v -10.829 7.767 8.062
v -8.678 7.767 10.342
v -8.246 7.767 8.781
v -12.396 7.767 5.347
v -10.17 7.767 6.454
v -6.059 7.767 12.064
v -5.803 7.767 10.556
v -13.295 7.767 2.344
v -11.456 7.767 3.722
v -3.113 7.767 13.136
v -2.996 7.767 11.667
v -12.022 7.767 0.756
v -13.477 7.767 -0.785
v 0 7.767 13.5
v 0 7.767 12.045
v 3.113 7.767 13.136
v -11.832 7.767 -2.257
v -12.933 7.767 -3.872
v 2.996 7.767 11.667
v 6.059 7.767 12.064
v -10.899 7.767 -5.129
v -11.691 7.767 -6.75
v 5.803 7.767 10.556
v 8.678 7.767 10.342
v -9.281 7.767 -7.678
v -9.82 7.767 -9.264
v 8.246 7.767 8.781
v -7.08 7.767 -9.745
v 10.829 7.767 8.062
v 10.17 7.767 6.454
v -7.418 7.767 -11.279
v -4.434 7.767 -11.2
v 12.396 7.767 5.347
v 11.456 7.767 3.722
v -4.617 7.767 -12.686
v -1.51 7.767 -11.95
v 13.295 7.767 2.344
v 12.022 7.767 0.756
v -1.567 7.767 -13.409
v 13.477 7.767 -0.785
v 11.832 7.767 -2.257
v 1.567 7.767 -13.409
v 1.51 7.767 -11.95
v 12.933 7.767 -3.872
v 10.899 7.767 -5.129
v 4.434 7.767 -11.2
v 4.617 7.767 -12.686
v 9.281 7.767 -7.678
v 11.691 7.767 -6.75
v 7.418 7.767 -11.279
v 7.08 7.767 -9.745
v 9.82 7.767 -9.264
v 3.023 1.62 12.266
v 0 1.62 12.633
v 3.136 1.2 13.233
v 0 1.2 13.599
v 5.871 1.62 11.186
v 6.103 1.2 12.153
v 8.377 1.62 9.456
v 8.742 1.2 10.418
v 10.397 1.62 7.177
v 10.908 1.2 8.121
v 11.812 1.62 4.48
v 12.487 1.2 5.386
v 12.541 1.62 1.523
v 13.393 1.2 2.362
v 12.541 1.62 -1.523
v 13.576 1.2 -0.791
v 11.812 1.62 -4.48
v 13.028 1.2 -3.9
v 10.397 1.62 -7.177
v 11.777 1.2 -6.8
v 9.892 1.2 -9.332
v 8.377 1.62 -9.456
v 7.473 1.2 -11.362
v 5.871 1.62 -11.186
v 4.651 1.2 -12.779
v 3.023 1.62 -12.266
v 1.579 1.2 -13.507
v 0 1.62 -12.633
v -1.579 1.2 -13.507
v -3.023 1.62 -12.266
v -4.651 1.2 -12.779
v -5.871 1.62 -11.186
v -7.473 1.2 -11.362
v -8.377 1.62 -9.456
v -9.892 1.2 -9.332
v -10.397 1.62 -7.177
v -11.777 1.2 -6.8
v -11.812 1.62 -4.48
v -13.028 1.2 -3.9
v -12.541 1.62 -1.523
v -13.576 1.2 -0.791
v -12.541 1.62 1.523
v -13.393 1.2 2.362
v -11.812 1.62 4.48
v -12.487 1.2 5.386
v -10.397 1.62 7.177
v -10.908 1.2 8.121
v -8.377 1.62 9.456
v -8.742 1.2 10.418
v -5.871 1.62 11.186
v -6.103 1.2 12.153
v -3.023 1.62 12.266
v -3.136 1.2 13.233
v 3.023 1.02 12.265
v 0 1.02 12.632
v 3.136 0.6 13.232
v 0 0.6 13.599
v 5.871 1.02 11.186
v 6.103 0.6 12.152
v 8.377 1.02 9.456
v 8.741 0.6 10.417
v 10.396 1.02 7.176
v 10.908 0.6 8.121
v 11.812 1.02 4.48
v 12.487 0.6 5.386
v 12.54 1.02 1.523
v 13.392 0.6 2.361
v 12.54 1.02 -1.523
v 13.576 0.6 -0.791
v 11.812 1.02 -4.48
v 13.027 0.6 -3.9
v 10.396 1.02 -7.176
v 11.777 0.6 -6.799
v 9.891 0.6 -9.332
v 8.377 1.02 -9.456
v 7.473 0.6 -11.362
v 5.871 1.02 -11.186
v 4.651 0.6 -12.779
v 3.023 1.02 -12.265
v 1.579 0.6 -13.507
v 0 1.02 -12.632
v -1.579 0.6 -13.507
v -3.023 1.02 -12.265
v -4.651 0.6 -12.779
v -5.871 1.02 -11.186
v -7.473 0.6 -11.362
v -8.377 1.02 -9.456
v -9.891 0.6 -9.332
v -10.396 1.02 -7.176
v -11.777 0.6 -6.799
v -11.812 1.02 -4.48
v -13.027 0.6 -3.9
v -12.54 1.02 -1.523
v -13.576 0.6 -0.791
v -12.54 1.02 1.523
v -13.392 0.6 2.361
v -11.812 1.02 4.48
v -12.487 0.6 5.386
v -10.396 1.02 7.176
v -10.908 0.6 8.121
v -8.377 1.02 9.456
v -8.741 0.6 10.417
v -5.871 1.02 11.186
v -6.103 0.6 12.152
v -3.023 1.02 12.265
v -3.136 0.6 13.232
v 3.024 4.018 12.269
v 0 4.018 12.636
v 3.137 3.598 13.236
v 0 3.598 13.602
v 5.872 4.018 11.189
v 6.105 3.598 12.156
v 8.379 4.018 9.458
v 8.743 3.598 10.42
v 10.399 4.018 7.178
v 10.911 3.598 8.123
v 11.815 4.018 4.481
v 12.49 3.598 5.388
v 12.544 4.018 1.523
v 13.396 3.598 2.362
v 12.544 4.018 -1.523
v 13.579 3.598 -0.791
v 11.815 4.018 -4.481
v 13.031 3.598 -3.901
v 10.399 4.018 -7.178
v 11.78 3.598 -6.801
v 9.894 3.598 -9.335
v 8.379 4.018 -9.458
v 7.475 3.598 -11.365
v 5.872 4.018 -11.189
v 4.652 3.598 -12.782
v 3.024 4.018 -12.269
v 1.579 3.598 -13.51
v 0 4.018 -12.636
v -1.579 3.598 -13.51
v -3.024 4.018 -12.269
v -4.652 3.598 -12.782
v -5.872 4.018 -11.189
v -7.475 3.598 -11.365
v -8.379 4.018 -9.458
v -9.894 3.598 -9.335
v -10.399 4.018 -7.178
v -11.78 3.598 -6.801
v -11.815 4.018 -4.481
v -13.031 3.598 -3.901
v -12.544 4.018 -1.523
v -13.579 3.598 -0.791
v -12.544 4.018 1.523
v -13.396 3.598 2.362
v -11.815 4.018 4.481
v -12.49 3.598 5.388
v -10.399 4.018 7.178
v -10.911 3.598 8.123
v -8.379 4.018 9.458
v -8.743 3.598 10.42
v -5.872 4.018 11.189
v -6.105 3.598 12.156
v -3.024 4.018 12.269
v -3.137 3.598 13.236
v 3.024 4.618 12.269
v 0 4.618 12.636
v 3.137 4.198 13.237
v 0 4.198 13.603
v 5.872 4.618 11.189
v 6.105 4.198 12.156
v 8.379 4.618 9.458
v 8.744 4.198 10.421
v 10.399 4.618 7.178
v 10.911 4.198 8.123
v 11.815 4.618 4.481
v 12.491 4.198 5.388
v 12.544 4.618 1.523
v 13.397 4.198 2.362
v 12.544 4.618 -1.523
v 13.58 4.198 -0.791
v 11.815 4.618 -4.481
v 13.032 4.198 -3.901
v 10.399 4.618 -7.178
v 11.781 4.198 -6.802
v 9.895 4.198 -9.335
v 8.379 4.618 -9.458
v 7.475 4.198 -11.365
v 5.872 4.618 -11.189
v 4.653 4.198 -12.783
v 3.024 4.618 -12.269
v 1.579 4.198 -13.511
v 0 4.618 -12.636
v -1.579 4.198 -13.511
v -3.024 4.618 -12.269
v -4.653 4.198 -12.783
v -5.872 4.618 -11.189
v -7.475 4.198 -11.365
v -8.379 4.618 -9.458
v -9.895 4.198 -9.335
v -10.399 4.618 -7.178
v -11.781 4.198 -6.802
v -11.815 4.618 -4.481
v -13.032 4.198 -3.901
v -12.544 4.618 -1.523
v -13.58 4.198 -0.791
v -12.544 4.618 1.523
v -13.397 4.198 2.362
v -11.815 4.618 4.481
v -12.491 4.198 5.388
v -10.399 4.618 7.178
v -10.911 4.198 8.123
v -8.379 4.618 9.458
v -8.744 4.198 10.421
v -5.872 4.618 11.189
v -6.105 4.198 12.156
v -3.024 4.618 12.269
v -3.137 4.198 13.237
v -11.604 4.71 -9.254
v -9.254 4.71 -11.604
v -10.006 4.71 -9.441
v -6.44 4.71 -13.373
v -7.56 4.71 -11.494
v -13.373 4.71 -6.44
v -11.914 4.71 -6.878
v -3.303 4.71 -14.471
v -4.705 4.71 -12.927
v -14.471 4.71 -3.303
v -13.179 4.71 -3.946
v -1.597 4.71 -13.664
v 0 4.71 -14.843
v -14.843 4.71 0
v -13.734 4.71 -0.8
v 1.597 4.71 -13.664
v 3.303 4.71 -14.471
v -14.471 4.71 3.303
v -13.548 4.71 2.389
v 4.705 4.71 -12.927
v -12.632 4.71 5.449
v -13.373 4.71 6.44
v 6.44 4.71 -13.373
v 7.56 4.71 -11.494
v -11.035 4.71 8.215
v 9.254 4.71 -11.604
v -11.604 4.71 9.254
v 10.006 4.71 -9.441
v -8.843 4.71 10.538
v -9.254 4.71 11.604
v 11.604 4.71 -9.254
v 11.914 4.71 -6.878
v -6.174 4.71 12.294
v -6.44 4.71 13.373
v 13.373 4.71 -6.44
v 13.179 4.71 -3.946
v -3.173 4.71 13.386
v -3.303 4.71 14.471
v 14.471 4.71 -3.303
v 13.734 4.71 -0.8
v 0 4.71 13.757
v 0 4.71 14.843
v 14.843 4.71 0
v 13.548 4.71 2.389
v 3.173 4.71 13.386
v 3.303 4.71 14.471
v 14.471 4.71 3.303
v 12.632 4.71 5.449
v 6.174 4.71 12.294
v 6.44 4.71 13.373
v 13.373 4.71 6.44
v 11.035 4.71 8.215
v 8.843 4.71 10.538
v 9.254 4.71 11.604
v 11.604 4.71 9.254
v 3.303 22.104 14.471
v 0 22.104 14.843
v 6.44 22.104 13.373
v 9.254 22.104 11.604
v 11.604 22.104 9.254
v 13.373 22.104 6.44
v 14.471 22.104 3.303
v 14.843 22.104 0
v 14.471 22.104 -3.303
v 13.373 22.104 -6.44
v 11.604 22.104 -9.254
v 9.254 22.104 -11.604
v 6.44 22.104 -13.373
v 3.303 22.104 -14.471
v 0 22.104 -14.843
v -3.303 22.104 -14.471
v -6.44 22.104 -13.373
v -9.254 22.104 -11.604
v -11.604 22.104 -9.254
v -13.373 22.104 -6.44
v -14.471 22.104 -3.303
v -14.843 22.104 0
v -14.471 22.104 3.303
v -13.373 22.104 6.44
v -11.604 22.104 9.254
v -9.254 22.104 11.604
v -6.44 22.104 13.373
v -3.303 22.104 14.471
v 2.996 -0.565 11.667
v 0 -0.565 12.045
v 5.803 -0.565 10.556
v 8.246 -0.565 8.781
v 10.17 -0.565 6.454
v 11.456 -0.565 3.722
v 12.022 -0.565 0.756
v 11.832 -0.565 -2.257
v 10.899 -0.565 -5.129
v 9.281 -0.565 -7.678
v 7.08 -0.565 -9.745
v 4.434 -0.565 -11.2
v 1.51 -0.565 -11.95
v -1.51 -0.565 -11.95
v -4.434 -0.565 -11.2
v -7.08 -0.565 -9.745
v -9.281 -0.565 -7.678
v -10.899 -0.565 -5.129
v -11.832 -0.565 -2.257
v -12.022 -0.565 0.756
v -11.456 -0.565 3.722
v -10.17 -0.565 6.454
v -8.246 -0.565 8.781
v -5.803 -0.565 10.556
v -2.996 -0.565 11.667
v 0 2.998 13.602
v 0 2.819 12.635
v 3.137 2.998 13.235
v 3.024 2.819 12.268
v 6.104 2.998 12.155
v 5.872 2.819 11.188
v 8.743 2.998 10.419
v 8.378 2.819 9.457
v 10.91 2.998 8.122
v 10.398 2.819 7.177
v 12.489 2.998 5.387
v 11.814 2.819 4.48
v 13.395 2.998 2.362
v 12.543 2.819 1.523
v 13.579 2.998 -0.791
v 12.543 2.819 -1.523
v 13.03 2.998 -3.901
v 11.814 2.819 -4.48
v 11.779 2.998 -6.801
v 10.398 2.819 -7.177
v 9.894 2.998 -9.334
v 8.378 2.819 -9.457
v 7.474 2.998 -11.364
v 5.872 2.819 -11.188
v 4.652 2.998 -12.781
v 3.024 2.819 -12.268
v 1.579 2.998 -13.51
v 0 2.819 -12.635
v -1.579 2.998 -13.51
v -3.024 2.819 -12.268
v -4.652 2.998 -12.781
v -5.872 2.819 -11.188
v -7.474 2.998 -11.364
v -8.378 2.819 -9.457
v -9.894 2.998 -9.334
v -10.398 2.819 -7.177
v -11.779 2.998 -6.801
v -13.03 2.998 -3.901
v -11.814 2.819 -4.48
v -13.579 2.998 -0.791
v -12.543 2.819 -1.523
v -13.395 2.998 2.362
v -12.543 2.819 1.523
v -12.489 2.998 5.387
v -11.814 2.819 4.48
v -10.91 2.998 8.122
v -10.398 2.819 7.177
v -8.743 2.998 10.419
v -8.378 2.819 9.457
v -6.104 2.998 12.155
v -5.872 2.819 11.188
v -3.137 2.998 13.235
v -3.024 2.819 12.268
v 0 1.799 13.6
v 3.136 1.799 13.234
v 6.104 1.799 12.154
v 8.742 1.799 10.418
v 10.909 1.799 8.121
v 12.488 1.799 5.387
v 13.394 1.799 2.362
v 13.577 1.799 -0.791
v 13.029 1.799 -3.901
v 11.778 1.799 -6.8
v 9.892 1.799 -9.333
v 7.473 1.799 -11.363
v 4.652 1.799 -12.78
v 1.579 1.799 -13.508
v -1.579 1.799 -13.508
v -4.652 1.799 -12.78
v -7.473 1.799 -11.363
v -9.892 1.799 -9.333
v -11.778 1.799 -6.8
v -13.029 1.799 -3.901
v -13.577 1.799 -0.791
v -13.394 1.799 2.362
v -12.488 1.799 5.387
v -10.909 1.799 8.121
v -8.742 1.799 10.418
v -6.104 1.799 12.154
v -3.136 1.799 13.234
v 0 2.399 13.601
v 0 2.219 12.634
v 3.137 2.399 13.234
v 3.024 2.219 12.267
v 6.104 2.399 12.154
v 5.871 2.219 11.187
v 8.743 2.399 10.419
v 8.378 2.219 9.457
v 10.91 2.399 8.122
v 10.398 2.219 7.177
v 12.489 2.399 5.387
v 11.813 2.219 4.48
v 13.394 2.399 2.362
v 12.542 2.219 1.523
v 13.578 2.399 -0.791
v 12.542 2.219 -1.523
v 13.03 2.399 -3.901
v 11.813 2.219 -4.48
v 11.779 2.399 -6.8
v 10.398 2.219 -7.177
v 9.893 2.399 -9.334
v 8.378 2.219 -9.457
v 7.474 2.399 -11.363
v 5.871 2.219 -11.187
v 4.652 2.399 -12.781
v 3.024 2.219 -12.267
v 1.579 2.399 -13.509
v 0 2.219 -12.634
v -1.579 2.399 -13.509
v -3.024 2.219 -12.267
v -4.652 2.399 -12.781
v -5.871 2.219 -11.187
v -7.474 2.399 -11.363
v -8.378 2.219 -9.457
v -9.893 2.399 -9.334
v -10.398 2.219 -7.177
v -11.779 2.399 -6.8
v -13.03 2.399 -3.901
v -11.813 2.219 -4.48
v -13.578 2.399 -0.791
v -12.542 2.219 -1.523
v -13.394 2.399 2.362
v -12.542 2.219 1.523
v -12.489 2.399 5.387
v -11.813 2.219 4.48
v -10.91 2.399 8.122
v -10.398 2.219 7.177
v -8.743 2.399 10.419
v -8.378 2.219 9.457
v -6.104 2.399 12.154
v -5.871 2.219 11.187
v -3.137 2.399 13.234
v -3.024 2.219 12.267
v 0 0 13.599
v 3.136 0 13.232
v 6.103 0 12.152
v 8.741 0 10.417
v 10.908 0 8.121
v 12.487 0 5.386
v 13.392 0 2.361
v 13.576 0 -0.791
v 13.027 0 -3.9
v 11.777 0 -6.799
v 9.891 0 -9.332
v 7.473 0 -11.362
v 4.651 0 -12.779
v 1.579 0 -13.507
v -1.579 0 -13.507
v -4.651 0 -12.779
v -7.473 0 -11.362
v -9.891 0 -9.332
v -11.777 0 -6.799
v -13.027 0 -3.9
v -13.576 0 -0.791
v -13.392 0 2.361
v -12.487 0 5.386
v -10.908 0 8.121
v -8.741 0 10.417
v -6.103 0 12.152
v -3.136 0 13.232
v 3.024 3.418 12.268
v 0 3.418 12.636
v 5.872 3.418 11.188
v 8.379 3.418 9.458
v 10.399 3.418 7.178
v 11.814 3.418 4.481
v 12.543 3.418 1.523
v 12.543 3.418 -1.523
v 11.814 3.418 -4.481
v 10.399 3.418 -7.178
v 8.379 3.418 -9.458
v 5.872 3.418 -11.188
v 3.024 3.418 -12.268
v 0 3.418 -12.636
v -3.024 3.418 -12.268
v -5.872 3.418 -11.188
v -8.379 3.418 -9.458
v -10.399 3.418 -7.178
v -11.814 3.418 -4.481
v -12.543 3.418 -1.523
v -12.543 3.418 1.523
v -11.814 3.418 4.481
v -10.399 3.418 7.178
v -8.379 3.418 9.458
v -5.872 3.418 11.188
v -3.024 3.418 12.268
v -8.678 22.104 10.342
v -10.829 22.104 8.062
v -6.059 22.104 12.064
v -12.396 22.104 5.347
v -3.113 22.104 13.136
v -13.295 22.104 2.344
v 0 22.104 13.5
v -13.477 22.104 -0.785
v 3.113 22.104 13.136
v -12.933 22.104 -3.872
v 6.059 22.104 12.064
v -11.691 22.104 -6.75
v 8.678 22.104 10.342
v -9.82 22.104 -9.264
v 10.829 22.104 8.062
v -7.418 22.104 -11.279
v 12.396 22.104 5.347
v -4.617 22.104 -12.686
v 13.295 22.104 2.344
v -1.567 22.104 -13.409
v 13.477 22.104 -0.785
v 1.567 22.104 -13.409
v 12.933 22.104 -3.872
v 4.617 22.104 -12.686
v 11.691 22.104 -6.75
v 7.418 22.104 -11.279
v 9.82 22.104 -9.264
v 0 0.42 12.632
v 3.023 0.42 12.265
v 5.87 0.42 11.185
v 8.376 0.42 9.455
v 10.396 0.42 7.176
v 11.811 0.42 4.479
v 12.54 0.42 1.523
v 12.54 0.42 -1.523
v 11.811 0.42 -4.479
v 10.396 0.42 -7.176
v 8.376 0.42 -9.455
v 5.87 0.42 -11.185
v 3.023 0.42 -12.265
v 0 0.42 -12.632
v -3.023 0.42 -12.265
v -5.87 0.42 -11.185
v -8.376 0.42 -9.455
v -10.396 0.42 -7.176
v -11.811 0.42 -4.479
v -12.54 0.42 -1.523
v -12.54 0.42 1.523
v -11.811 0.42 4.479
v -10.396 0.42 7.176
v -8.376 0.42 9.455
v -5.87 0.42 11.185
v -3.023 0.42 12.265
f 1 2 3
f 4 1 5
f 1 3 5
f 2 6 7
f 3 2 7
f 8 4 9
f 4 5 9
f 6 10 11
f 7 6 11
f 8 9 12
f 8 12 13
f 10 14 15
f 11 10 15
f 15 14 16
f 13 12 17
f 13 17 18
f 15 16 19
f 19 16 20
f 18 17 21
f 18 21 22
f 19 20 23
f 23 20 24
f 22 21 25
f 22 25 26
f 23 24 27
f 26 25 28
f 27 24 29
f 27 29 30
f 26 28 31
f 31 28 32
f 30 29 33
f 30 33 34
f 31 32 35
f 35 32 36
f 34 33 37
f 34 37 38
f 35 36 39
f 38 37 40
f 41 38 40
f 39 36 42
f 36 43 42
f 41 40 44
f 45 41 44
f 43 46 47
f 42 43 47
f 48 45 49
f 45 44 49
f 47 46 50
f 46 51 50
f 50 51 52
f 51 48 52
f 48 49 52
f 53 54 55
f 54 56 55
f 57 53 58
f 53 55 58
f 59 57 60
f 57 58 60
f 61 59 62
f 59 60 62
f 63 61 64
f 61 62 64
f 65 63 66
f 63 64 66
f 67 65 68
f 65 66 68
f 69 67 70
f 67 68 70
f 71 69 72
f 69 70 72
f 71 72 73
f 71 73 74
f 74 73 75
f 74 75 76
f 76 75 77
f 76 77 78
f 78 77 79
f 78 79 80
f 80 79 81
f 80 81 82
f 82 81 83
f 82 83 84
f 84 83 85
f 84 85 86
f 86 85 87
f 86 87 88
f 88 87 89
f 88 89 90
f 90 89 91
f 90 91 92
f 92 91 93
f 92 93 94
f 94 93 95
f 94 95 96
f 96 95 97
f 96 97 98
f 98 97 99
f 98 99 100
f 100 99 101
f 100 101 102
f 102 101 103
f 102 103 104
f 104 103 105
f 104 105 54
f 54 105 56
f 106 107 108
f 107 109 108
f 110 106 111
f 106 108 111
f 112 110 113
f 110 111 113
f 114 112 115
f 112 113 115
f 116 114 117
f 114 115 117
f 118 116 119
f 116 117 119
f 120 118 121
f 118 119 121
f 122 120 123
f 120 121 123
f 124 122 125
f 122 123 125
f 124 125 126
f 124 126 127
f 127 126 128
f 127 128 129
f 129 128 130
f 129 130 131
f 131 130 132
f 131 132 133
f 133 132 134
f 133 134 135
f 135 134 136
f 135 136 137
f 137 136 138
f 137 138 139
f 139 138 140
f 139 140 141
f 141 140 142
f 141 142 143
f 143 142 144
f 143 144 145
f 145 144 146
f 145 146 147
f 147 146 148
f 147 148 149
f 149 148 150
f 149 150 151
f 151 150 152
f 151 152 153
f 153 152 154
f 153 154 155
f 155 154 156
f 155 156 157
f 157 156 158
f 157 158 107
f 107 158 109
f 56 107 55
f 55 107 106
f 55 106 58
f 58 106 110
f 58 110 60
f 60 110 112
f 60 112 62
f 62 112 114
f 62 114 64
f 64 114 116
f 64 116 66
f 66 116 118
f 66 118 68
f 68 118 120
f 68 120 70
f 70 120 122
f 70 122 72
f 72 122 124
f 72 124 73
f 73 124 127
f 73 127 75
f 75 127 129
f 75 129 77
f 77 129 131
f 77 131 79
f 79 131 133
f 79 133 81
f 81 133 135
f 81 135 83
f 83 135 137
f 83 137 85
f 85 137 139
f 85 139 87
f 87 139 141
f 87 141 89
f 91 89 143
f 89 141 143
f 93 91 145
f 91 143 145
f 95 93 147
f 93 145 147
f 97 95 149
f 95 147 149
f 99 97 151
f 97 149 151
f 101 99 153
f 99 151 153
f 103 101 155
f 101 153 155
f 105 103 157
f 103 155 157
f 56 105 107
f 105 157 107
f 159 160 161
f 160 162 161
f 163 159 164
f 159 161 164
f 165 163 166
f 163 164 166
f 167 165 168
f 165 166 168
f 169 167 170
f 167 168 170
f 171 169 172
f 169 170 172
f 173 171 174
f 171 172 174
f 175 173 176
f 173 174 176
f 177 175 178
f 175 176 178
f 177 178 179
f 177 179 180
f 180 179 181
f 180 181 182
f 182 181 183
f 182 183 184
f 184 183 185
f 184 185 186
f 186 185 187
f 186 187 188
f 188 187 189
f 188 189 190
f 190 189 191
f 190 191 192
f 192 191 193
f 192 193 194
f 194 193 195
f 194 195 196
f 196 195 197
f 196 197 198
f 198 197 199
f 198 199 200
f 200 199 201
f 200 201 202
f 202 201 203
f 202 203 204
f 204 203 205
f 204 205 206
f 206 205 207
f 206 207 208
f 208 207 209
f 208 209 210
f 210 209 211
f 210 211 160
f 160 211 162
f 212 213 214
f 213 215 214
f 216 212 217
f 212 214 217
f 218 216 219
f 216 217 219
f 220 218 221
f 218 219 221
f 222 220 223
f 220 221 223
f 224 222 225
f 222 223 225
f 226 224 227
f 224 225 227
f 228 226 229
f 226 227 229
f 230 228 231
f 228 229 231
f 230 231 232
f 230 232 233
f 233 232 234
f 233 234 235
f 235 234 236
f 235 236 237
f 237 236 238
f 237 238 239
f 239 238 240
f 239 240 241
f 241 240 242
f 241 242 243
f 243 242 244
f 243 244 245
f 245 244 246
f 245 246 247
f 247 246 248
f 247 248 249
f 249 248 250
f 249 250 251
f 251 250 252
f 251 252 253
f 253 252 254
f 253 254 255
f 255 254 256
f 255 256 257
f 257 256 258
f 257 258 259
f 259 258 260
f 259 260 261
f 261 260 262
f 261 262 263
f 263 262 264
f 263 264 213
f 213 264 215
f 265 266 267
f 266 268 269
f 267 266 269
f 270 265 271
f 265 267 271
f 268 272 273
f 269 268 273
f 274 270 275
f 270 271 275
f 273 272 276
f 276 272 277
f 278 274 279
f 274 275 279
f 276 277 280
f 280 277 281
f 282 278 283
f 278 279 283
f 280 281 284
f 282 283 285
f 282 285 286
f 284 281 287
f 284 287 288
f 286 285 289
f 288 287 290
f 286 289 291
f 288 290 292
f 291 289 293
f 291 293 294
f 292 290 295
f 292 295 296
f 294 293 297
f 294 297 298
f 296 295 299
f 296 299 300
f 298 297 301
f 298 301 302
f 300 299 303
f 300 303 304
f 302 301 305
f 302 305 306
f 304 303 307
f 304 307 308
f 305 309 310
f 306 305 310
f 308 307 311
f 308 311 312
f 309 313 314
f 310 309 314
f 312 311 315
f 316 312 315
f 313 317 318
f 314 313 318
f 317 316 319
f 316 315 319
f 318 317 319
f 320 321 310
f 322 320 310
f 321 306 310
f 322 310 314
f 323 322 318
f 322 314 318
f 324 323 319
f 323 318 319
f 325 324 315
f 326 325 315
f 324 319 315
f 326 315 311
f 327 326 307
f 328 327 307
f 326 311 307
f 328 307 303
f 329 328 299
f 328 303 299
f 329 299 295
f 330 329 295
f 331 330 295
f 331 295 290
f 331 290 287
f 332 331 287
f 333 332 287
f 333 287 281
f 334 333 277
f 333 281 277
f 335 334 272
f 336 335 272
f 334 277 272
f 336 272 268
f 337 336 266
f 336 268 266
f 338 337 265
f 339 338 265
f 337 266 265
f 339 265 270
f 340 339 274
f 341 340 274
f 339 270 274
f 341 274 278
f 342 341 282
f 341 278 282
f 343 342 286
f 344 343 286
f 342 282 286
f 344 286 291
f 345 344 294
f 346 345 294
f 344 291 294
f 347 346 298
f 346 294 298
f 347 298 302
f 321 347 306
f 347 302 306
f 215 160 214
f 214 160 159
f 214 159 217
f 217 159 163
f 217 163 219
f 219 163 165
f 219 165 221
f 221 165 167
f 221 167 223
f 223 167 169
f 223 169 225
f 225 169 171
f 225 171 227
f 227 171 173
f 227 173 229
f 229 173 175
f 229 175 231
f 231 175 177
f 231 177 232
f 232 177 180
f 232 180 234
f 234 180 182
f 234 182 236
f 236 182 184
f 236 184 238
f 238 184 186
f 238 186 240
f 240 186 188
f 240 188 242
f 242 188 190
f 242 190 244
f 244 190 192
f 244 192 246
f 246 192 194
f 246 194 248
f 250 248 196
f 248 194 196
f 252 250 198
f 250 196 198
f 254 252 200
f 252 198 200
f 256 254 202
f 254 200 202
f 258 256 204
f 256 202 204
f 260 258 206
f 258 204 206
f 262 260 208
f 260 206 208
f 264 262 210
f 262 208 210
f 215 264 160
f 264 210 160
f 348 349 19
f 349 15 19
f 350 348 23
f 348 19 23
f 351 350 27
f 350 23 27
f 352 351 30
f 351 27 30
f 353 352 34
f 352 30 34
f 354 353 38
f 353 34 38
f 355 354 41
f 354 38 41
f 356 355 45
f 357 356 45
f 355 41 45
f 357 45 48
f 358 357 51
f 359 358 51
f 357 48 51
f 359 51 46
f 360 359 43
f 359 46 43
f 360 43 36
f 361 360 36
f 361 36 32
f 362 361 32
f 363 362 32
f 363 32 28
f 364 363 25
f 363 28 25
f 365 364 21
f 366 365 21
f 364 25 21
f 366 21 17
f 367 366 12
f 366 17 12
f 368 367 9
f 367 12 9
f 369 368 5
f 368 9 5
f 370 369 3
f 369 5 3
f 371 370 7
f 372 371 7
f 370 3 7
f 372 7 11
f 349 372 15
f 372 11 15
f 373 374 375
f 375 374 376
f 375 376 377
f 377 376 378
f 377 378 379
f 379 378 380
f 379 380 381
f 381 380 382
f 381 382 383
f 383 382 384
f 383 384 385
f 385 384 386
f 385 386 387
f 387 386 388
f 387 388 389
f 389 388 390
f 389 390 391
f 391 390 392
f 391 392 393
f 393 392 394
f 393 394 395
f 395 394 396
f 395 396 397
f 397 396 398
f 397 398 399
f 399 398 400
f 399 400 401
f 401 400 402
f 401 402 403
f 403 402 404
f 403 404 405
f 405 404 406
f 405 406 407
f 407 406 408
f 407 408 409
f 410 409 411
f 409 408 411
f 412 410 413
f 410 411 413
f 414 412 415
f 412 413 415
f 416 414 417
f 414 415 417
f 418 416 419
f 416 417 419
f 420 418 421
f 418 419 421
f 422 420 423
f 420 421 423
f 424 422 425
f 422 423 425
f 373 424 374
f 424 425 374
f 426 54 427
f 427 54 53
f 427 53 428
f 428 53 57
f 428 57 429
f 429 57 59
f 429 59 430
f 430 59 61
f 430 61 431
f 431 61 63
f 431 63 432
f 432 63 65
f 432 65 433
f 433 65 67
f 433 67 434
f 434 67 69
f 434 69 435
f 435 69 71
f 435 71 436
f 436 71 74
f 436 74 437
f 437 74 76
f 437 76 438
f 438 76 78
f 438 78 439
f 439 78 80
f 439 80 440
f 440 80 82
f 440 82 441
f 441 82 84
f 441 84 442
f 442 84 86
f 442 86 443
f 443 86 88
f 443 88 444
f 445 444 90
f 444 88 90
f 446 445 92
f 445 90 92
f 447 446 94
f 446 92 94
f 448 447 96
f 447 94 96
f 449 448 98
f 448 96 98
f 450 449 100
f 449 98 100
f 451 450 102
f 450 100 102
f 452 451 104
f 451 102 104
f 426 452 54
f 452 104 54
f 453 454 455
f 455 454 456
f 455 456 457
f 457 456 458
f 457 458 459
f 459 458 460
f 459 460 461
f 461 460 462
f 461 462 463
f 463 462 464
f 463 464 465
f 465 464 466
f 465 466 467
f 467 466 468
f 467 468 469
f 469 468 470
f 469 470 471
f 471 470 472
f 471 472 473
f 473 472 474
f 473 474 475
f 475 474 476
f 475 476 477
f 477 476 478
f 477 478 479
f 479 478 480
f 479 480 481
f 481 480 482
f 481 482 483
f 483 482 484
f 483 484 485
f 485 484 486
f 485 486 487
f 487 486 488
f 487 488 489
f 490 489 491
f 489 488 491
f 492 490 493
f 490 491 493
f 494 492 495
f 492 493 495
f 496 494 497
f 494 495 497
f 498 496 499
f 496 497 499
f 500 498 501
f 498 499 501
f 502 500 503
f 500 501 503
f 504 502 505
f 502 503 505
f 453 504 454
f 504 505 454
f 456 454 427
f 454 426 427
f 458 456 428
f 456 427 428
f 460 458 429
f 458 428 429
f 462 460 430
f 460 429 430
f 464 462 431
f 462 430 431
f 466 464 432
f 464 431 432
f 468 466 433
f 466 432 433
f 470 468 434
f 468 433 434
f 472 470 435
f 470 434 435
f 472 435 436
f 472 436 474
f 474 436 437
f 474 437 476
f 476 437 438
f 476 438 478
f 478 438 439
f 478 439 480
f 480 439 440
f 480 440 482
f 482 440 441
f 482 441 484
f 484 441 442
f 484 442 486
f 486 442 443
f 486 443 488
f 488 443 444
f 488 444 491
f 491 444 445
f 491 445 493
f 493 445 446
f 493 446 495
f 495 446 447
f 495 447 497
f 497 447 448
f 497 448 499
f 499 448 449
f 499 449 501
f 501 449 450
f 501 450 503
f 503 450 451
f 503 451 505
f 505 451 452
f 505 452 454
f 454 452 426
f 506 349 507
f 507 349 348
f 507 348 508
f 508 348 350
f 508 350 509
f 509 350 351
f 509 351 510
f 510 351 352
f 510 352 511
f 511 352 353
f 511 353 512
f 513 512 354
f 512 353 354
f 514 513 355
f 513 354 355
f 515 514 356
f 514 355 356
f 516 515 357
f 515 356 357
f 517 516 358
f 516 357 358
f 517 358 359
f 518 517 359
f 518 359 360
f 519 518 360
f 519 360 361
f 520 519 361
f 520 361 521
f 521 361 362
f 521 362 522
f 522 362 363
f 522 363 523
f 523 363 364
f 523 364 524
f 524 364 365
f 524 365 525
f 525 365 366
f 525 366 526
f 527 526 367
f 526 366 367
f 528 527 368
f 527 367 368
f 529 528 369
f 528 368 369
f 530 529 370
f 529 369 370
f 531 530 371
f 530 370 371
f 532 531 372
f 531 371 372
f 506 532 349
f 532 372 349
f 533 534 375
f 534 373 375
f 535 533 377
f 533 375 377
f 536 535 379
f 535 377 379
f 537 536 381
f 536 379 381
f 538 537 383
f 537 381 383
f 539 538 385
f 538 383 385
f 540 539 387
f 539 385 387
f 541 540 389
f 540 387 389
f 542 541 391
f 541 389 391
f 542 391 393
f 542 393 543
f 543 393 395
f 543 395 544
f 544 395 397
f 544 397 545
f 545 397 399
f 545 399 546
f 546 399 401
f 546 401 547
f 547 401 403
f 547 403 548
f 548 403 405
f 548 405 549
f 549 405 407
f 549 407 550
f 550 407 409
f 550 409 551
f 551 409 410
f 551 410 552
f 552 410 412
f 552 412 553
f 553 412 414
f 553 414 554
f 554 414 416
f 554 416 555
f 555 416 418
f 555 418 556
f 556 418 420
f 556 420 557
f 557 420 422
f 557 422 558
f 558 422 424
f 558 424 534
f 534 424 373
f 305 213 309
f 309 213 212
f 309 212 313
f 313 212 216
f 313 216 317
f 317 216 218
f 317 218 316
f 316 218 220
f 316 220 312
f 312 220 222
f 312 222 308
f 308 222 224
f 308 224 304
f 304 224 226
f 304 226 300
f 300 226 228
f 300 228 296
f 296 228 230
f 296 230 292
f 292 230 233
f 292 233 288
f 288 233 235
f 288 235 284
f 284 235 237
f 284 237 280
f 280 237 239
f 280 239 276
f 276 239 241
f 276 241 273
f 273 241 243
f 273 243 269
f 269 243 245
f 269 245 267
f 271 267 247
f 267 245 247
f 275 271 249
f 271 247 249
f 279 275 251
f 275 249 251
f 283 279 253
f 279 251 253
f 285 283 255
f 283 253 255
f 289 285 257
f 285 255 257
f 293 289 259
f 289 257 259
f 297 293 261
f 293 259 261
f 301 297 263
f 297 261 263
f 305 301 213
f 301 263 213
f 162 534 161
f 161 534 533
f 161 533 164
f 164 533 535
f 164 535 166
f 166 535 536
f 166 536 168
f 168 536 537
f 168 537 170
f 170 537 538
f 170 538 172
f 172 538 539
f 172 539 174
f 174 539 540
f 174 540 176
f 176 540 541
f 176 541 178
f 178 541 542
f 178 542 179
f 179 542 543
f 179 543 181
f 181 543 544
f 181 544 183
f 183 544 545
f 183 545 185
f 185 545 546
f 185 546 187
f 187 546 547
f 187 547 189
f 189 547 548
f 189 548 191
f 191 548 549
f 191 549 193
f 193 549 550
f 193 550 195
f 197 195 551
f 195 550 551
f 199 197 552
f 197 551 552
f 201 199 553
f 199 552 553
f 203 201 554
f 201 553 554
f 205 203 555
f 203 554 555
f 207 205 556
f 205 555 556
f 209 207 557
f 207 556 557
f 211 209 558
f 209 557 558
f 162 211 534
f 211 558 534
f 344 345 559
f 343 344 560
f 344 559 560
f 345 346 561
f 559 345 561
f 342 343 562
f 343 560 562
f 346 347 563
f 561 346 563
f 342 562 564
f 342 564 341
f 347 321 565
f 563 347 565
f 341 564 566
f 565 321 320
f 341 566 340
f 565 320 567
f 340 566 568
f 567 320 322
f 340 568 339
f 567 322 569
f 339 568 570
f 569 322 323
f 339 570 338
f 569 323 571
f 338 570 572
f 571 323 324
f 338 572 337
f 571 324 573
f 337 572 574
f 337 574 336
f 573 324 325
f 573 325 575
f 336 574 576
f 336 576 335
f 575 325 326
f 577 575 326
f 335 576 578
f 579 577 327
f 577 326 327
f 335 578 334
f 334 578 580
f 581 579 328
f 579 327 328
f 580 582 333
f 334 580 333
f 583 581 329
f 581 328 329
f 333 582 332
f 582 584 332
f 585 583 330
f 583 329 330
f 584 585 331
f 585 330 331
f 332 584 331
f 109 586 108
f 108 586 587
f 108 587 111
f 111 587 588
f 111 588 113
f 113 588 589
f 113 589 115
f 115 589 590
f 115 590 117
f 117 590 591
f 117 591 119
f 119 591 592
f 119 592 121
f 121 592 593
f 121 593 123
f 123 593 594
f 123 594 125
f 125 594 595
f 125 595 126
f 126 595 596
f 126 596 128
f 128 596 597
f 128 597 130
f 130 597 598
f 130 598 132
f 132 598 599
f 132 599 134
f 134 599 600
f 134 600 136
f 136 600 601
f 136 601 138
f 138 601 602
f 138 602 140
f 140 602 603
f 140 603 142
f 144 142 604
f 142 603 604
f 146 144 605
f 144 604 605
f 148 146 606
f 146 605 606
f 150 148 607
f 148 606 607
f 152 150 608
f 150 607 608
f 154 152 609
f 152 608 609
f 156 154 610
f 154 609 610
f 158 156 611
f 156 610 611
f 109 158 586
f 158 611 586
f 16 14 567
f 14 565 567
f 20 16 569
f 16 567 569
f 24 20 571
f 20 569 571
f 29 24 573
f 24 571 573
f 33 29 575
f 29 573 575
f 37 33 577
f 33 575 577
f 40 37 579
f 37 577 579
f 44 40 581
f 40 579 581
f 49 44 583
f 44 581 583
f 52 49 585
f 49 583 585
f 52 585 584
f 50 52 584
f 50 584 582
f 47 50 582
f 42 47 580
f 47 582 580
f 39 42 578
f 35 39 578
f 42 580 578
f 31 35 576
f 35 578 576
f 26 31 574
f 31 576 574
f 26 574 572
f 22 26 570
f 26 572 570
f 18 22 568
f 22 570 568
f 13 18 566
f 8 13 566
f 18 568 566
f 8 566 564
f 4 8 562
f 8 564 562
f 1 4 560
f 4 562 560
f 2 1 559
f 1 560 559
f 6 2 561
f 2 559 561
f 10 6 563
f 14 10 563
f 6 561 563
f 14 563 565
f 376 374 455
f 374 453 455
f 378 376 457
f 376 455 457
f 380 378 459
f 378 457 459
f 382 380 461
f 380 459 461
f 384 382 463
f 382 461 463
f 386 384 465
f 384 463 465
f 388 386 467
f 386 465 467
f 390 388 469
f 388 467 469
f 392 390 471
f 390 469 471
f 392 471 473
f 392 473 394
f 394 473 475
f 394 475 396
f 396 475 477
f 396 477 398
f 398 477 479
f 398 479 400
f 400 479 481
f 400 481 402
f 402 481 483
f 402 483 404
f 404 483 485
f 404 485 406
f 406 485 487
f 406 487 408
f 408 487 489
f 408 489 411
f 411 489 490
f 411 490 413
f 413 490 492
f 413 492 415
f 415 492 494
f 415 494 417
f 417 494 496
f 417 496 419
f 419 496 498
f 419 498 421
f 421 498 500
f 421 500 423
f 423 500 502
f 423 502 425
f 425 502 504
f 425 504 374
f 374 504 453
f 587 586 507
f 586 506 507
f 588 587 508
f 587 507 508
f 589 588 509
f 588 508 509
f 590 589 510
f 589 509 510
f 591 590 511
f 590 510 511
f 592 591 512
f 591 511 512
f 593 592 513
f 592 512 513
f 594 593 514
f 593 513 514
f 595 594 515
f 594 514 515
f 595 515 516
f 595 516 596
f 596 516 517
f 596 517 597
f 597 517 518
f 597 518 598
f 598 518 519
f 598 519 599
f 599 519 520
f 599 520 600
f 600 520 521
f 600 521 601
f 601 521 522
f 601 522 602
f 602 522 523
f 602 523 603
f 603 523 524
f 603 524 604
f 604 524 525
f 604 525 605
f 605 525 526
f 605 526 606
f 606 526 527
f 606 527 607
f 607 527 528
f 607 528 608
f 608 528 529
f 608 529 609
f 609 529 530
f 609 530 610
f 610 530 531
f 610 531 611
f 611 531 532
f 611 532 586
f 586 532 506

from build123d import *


# Not quite as in the source:
# - ends of sketch curves that miss each other by under 0.0002 mm in the source are joined


with BuildPart() as f1:
    # F0 (on Right) → F1 (revolve)
    with BuildSketch(Plane.YZ):
        Polygon((0, 13.5986562818), (-0.5646626814, 12.0454436497), (7.7669508635, 12.0454436497), (7.7669508635, 13.5), (22.1037470661, 13.5), (22.1037470661, 14.8426934129), (4.7102691696, 14.8426934129), (4.7102691696, 13.7568386238), (4.6180134269, 12.6362909356), (4.1976161123, 13.6032054045), (4.0180134269, 12.6362909356), (3.5980134269, 13.6024472174), (3.4184107415, 12.6355327485), (2.9984107415, 13.6016890303), (2.8188080562, 12.6347745614), (2.3988080562, 13.6009308432), (2.2192053708, 12.6340163742), (1.7992053708, 13.6001726561), (1.6196026854, 12.6332581871), (1.1996026854, 13.5994144689), (1.02, 12.6325), (0.6, 13.5986562818), (0.4203973146, 12.6317418129), align=None)
    revolve(axis=Axis((0, 14.1517902564, 0), (0, 1, 0)))


solid = f1.part
